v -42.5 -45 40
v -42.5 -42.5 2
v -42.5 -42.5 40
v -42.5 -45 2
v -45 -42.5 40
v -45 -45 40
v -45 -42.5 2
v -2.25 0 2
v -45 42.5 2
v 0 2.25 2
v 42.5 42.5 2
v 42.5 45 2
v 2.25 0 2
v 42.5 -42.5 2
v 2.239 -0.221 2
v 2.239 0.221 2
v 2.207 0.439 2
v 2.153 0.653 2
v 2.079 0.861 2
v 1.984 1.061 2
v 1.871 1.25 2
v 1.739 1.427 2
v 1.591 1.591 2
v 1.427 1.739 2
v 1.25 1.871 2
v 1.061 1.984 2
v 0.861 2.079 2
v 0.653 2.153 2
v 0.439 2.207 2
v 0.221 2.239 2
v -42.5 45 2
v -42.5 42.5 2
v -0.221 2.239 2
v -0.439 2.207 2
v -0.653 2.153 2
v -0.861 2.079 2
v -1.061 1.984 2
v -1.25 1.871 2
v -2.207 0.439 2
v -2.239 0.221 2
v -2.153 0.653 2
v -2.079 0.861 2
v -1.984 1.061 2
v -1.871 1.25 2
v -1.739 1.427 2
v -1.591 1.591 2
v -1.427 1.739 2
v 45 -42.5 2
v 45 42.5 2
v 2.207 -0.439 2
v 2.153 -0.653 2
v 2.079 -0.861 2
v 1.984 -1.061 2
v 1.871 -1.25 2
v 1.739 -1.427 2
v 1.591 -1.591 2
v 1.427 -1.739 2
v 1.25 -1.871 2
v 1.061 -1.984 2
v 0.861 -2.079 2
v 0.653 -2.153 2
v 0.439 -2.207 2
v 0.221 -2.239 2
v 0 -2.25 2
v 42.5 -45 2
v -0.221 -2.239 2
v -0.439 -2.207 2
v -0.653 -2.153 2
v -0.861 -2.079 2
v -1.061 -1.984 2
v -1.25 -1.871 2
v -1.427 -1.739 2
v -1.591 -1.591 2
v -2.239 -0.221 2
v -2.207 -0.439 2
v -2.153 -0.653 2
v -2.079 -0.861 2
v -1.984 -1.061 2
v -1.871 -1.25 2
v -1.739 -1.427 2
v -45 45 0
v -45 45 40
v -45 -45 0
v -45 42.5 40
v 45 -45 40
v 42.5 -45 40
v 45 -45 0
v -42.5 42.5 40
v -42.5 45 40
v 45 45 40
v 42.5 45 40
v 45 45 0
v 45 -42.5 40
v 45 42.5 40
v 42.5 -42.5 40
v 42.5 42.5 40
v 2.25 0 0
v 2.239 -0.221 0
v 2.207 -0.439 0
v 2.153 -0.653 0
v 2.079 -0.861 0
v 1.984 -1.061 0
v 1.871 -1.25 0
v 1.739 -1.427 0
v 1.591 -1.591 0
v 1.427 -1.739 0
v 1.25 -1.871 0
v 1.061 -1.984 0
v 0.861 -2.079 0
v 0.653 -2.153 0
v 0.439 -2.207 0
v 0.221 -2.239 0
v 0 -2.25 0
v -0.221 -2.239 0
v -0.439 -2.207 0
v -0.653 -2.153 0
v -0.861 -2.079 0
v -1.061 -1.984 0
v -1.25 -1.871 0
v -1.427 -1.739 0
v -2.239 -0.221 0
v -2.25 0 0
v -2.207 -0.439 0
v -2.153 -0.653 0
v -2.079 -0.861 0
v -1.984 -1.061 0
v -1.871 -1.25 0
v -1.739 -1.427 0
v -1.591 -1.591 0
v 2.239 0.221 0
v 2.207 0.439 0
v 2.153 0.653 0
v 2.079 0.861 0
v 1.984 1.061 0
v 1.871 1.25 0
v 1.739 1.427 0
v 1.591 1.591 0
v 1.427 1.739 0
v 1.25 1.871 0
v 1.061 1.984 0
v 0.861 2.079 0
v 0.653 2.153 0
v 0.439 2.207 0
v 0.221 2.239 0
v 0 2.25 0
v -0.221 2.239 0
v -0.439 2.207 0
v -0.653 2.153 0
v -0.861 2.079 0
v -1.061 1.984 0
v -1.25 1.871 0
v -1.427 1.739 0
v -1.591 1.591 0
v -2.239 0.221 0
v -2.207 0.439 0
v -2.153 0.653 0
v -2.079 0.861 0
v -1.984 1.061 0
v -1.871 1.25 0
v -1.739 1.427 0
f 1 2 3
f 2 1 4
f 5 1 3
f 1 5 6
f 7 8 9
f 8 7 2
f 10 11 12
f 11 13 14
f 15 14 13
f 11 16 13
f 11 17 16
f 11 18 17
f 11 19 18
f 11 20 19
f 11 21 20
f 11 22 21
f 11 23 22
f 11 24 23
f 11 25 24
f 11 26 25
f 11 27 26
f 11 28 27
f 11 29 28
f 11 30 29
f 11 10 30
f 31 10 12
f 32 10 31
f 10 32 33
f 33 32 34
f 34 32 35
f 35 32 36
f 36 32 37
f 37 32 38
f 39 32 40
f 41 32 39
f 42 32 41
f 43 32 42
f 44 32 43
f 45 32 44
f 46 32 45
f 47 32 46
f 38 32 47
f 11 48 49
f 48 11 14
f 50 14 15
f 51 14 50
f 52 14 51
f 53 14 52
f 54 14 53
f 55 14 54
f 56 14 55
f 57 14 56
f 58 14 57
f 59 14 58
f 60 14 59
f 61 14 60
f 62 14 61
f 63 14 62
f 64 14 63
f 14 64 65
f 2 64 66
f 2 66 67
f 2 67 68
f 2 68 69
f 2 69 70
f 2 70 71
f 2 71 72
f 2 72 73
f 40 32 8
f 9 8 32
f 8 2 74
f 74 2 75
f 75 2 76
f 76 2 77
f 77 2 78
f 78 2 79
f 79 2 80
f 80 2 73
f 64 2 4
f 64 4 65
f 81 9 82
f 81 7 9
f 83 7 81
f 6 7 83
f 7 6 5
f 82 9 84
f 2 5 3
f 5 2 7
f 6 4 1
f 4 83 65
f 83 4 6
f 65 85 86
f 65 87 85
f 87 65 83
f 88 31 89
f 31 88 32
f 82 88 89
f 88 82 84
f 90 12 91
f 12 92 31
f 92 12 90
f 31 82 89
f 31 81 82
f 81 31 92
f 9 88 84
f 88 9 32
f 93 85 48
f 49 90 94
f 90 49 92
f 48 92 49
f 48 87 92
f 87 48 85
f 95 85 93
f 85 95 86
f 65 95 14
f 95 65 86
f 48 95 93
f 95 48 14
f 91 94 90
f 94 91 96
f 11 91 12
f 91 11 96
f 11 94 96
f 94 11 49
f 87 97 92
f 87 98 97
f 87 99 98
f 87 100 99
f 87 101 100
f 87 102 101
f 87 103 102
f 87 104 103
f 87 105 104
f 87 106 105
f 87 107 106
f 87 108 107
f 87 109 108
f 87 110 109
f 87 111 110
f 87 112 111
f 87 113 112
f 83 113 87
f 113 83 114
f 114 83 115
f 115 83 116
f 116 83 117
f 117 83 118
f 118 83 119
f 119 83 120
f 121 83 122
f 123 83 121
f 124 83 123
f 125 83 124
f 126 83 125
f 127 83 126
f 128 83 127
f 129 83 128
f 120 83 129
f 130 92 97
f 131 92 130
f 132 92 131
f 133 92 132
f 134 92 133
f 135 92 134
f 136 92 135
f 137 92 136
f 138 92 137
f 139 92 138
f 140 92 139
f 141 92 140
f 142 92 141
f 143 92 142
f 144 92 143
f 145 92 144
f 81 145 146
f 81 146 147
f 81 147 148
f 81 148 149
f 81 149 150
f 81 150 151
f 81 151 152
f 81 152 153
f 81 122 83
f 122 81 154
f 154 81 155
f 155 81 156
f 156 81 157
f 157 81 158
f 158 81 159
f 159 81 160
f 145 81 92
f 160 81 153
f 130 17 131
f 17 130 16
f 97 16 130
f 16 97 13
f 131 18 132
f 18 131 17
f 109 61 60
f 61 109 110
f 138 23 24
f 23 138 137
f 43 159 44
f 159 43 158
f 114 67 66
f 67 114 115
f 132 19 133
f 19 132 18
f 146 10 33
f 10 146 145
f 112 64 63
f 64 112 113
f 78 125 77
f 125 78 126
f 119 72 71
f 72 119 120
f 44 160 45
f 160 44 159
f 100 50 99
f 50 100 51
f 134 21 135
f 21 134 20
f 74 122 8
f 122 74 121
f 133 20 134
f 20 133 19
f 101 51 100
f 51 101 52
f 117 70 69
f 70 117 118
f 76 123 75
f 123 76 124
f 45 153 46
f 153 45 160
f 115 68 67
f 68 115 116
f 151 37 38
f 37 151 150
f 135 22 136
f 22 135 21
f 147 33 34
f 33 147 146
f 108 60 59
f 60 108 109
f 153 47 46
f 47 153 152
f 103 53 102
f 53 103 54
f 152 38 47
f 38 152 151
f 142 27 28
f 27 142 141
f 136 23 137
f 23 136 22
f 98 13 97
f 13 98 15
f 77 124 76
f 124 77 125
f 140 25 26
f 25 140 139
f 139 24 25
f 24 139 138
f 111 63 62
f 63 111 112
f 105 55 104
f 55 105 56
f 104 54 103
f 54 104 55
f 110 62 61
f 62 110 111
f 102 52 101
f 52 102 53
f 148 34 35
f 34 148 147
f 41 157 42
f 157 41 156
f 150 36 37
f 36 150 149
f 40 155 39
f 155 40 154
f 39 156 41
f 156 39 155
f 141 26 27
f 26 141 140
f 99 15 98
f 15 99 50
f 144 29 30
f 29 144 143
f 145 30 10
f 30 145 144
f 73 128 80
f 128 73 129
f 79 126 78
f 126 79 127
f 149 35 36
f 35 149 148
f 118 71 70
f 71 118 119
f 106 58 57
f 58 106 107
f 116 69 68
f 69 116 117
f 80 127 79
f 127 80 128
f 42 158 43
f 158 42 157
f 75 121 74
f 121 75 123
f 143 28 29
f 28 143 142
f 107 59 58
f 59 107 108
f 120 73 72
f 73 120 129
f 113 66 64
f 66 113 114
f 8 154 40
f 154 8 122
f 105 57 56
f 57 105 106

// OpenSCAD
// Magnetic stirrer housing for 80 mm PC case fan
// Print orientation: top plate on bed (z = 0), open top at z = 40

// ---- Dimensions (mm) ----
top_t       = 2;     // top plate thickness
wall_t      = 2.5;   // wall thickness
box_h       = 40;    // total height of box (open top)
outer_w     = 90;    // outer size in X
outer_d     = 90;    // outer size in Y
hole        = 4.5;   // M4 screw hole diameter
hole_pitch  = 71.5;  // square pattern size for screw holes
notch_w     = 12;    // cable notch width
notch_depth = 8;     // notch depth from open edge (z = 32 to 40)
eps         = 0.5;   // cutter overshoot

$fn = 64;

difference() {
    // Main box body
    union() {
        // Top plate
        translate([-outer_w/2, -outer_d/2, 0])
            cube([outer_w, outer_d, top_t]);
        // Walls
        for (sx = [-1, 1], sy = [-1, 1])
            translate([sx > 0 ? outer_w/2 - wall_t : -outer_w/2,
                       sy > 0 ? outer_d/2 - wall_t : -outer_d/2,
                       top_t])
                cube([wall_t, wall_t, box_h - top_t]);
    }

    // Screw holes through top plate
    for (i = [0:3])
        rotate([0, 0, i * 90])
            translate([0, 0, -eps])
                cylinder(d = hole, h = top_t + 2 * eps);

    // Cable notch in one wall (z = 32 to 40)
    translate([outer_w/2 - wall_t, -notch_w/2, notch_depth])
        cube([wall_t + eps, notch_w, notch_depth + eps]);
}
